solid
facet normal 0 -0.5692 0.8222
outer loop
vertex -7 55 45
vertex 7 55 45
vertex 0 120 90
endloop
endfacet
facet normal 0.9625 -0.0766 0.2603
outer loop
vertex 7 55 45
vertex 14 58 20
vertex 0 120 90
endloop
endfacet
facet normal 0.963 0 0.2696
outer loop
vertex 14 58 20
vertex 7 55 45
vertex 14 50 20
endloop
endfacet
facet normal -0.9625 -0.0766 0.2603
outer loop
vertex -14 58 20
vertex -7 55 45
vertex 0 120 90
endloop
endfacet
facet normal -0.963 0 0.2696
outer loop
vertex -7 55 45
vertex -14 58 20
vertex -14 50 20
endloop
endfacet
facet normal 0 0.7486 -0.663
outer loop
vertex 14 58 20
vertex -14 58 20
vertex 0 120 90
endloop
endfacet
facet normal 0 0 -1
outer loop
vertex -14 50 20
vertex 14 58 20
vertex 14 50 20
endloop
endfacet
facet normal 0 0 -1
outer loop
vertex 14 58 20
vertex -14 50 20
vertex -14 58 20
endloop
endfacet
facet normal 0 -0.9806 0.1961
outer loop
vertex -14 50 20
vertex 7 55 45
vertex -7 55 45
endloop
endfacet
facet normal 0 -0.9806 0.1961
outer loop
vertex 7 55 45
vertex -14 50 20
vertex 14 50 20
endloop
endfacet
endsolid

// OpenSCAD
module parteroja(){
	polyhedron(
        points=[[0,0,0], [20,0,0], [18,40,4], [0,40,4], 
                 [23,44,30], [0,44,30], [0,8,44], [15,8,44],
                 [13,-3,40], [0,-3,40], [0,-10,25], [28,-10,25]],
    
        faces=[[0,1,2,3],[2,3,5,4],[1,2,4,11],[11,4,7],[4,5,6,7],[7,6,9,8]]
	);
}

module parteazul(){ 
 polyhedron(
        points=[[0,0,0], [20,0,0], [18,40,4], [0,40,4], 
                 [23,44,30], [0,44,30], [0,8,44], [15,8,44],
                 [13,-3,40], [0,-3,40], [0,-10,25], [28,-10,25]],
    
        faces=[[1,11,10,0],[10,11,8,9],[11,7,8]]
    );      
}

module cola(){
	polyhedron(
		points=[[0,70,70],[7,5,25], [-7,5,25],[14,8,0],
                 [-14,8,0], [14,0,0], [-14,0,0]],

		faces=[[0,1,2], [0,3,5,1], [0,2,6,4], [0,4,3],
                [3,4,6,5], [1,5,6,2]]
		);
}

module pie(){
	polyhedron(
		points=[[20,0,0], [0,0,0], [0,45,0], [20,45,0],
                [0,51,13], [20,51,13], [20,-5,9], [0,-5,9],
                [20,29,20], [0,29,25], [20,29,0]],

		faces=[ [3,2,1,0], [2,3,5,4],
                [6,0,1,7], [6,7,9,8], [9,4,5,8],
                [0,6,8,5,3,10], [4,9,7,1,2]]
	);
}

module cabezaroja(){
	polyhedron(
		points = [[18,34,0], [0,34,0], [8,0,0], [8,-2,2], 
                  [0,0,0], [0,-2,2],[15,30,16], [12,25,23],
                  [0,25,23], [0,35,30], [12,35,30], [12,44,32],
                  [0,44,32], [17,47,23], [18,40,14], [20,60,9], 
                  [20,64,22], [9,62,36],[0,62,36], [0,64,22],
                  [0,60,9],[11,10,0],[0,10,0],[0,11,12],[10,11,12]],
    
		faces = [[0,1,22,21], [6,7,24,21,0], [8,7,24,23], [7,8,9,10], 
                [9,10,11,12], [6,0,15,16,13], [13,11,17,16], [11,12,18,17],            [17,16,19,18], [16,15,20,19], [20,1,0,15]]
	);
}
module ojo(){
    polyhedron(
		points = [[18,34,0], [0,34,0], [8,0,0], [8,-2,2], 
                  [0,0,0], [0,-2,2],[15,30,16], [12,25,23],
                  [0,25,23], [0,35,30], [12,35,30], [12,44,32],
                  [0,44,32], [17,47,23], [18,40,14], [20,60,9], 
                  [20,64,22], [9,62,36],[0,62,36], [0,64,22],
                  [0,60,9],[11,10,0],[0,10,0],[0,11,12],[10,11,12]],
       
		faces = [[6,7,10,11,13]]
	);
    
}
module nariz(){
    polyhedron(
        points = [[18,34,0], [0,34,0], [8,0,0], [8,-2,2], 
                  [0,0,0], [0,-2,2],[15,30,16], [12,25,23],
                  [0,25,23], [0,35,30], [9,35,30], [12,44,32],
                  [0,44,32], [17,47,23], [18,40,14], [20,60,9], 
                  [20,64,22], [9,62,36],[0,62,36], [0,64,22],
                  [0,60,9],[11,10,0],[0,10,0],[0,11,12],[10,11,12]],
        faces = [[21,22,4,2],[2,4,5,3],[23,24,3,5],[2,21,24,3]]
	);
}
module cuerpo(){
	union(){
		color([246/255,25/255,84/255]) parteroja();
        color([69/255,189/255,250/255]) parteazul();
		mirror([1,0,0]){
			color([246/255,25/255,84/255]) parteroja();
            color([69/255,189/255,250/255]) parteazul();
		}
	}
}

module pies(){
	color([69/255,189/255,250/255]) union(){
		translate([20,0,0]) pie();
		mirror([1,0,0]){
			translate([20,0,0]) pie();
		}
	}
}

module cabeza(){
	union(){
		color([246/255,25/255,84/255]) cabezaroja();
        color([69/255,189/255,250/255]) nariz();
        color("White") ojo();
        translate([14,35,23])color("Black") rotate([0,75,-10])circle(4);
		mirror([1,0,0]){
			color([246/255,25/255,84/255]) cabezaroja();
            color([69/255,189/255,250/255]) nariz();
            color("White") ojo();
            translate([14,35,23])color("Black") rotate([0,75,-10])circle(4);
		}
	}
}

module porygon(){   
	union(){
		translate([0,-25,45])cabeza();
		translate([0,20,10])cuerpo();
		translate([0,50,20]) color([69/255,189/255,250/255]) cola();
		scale([0.9,0.9,0.9]) pies();
    }
}

porygon();
